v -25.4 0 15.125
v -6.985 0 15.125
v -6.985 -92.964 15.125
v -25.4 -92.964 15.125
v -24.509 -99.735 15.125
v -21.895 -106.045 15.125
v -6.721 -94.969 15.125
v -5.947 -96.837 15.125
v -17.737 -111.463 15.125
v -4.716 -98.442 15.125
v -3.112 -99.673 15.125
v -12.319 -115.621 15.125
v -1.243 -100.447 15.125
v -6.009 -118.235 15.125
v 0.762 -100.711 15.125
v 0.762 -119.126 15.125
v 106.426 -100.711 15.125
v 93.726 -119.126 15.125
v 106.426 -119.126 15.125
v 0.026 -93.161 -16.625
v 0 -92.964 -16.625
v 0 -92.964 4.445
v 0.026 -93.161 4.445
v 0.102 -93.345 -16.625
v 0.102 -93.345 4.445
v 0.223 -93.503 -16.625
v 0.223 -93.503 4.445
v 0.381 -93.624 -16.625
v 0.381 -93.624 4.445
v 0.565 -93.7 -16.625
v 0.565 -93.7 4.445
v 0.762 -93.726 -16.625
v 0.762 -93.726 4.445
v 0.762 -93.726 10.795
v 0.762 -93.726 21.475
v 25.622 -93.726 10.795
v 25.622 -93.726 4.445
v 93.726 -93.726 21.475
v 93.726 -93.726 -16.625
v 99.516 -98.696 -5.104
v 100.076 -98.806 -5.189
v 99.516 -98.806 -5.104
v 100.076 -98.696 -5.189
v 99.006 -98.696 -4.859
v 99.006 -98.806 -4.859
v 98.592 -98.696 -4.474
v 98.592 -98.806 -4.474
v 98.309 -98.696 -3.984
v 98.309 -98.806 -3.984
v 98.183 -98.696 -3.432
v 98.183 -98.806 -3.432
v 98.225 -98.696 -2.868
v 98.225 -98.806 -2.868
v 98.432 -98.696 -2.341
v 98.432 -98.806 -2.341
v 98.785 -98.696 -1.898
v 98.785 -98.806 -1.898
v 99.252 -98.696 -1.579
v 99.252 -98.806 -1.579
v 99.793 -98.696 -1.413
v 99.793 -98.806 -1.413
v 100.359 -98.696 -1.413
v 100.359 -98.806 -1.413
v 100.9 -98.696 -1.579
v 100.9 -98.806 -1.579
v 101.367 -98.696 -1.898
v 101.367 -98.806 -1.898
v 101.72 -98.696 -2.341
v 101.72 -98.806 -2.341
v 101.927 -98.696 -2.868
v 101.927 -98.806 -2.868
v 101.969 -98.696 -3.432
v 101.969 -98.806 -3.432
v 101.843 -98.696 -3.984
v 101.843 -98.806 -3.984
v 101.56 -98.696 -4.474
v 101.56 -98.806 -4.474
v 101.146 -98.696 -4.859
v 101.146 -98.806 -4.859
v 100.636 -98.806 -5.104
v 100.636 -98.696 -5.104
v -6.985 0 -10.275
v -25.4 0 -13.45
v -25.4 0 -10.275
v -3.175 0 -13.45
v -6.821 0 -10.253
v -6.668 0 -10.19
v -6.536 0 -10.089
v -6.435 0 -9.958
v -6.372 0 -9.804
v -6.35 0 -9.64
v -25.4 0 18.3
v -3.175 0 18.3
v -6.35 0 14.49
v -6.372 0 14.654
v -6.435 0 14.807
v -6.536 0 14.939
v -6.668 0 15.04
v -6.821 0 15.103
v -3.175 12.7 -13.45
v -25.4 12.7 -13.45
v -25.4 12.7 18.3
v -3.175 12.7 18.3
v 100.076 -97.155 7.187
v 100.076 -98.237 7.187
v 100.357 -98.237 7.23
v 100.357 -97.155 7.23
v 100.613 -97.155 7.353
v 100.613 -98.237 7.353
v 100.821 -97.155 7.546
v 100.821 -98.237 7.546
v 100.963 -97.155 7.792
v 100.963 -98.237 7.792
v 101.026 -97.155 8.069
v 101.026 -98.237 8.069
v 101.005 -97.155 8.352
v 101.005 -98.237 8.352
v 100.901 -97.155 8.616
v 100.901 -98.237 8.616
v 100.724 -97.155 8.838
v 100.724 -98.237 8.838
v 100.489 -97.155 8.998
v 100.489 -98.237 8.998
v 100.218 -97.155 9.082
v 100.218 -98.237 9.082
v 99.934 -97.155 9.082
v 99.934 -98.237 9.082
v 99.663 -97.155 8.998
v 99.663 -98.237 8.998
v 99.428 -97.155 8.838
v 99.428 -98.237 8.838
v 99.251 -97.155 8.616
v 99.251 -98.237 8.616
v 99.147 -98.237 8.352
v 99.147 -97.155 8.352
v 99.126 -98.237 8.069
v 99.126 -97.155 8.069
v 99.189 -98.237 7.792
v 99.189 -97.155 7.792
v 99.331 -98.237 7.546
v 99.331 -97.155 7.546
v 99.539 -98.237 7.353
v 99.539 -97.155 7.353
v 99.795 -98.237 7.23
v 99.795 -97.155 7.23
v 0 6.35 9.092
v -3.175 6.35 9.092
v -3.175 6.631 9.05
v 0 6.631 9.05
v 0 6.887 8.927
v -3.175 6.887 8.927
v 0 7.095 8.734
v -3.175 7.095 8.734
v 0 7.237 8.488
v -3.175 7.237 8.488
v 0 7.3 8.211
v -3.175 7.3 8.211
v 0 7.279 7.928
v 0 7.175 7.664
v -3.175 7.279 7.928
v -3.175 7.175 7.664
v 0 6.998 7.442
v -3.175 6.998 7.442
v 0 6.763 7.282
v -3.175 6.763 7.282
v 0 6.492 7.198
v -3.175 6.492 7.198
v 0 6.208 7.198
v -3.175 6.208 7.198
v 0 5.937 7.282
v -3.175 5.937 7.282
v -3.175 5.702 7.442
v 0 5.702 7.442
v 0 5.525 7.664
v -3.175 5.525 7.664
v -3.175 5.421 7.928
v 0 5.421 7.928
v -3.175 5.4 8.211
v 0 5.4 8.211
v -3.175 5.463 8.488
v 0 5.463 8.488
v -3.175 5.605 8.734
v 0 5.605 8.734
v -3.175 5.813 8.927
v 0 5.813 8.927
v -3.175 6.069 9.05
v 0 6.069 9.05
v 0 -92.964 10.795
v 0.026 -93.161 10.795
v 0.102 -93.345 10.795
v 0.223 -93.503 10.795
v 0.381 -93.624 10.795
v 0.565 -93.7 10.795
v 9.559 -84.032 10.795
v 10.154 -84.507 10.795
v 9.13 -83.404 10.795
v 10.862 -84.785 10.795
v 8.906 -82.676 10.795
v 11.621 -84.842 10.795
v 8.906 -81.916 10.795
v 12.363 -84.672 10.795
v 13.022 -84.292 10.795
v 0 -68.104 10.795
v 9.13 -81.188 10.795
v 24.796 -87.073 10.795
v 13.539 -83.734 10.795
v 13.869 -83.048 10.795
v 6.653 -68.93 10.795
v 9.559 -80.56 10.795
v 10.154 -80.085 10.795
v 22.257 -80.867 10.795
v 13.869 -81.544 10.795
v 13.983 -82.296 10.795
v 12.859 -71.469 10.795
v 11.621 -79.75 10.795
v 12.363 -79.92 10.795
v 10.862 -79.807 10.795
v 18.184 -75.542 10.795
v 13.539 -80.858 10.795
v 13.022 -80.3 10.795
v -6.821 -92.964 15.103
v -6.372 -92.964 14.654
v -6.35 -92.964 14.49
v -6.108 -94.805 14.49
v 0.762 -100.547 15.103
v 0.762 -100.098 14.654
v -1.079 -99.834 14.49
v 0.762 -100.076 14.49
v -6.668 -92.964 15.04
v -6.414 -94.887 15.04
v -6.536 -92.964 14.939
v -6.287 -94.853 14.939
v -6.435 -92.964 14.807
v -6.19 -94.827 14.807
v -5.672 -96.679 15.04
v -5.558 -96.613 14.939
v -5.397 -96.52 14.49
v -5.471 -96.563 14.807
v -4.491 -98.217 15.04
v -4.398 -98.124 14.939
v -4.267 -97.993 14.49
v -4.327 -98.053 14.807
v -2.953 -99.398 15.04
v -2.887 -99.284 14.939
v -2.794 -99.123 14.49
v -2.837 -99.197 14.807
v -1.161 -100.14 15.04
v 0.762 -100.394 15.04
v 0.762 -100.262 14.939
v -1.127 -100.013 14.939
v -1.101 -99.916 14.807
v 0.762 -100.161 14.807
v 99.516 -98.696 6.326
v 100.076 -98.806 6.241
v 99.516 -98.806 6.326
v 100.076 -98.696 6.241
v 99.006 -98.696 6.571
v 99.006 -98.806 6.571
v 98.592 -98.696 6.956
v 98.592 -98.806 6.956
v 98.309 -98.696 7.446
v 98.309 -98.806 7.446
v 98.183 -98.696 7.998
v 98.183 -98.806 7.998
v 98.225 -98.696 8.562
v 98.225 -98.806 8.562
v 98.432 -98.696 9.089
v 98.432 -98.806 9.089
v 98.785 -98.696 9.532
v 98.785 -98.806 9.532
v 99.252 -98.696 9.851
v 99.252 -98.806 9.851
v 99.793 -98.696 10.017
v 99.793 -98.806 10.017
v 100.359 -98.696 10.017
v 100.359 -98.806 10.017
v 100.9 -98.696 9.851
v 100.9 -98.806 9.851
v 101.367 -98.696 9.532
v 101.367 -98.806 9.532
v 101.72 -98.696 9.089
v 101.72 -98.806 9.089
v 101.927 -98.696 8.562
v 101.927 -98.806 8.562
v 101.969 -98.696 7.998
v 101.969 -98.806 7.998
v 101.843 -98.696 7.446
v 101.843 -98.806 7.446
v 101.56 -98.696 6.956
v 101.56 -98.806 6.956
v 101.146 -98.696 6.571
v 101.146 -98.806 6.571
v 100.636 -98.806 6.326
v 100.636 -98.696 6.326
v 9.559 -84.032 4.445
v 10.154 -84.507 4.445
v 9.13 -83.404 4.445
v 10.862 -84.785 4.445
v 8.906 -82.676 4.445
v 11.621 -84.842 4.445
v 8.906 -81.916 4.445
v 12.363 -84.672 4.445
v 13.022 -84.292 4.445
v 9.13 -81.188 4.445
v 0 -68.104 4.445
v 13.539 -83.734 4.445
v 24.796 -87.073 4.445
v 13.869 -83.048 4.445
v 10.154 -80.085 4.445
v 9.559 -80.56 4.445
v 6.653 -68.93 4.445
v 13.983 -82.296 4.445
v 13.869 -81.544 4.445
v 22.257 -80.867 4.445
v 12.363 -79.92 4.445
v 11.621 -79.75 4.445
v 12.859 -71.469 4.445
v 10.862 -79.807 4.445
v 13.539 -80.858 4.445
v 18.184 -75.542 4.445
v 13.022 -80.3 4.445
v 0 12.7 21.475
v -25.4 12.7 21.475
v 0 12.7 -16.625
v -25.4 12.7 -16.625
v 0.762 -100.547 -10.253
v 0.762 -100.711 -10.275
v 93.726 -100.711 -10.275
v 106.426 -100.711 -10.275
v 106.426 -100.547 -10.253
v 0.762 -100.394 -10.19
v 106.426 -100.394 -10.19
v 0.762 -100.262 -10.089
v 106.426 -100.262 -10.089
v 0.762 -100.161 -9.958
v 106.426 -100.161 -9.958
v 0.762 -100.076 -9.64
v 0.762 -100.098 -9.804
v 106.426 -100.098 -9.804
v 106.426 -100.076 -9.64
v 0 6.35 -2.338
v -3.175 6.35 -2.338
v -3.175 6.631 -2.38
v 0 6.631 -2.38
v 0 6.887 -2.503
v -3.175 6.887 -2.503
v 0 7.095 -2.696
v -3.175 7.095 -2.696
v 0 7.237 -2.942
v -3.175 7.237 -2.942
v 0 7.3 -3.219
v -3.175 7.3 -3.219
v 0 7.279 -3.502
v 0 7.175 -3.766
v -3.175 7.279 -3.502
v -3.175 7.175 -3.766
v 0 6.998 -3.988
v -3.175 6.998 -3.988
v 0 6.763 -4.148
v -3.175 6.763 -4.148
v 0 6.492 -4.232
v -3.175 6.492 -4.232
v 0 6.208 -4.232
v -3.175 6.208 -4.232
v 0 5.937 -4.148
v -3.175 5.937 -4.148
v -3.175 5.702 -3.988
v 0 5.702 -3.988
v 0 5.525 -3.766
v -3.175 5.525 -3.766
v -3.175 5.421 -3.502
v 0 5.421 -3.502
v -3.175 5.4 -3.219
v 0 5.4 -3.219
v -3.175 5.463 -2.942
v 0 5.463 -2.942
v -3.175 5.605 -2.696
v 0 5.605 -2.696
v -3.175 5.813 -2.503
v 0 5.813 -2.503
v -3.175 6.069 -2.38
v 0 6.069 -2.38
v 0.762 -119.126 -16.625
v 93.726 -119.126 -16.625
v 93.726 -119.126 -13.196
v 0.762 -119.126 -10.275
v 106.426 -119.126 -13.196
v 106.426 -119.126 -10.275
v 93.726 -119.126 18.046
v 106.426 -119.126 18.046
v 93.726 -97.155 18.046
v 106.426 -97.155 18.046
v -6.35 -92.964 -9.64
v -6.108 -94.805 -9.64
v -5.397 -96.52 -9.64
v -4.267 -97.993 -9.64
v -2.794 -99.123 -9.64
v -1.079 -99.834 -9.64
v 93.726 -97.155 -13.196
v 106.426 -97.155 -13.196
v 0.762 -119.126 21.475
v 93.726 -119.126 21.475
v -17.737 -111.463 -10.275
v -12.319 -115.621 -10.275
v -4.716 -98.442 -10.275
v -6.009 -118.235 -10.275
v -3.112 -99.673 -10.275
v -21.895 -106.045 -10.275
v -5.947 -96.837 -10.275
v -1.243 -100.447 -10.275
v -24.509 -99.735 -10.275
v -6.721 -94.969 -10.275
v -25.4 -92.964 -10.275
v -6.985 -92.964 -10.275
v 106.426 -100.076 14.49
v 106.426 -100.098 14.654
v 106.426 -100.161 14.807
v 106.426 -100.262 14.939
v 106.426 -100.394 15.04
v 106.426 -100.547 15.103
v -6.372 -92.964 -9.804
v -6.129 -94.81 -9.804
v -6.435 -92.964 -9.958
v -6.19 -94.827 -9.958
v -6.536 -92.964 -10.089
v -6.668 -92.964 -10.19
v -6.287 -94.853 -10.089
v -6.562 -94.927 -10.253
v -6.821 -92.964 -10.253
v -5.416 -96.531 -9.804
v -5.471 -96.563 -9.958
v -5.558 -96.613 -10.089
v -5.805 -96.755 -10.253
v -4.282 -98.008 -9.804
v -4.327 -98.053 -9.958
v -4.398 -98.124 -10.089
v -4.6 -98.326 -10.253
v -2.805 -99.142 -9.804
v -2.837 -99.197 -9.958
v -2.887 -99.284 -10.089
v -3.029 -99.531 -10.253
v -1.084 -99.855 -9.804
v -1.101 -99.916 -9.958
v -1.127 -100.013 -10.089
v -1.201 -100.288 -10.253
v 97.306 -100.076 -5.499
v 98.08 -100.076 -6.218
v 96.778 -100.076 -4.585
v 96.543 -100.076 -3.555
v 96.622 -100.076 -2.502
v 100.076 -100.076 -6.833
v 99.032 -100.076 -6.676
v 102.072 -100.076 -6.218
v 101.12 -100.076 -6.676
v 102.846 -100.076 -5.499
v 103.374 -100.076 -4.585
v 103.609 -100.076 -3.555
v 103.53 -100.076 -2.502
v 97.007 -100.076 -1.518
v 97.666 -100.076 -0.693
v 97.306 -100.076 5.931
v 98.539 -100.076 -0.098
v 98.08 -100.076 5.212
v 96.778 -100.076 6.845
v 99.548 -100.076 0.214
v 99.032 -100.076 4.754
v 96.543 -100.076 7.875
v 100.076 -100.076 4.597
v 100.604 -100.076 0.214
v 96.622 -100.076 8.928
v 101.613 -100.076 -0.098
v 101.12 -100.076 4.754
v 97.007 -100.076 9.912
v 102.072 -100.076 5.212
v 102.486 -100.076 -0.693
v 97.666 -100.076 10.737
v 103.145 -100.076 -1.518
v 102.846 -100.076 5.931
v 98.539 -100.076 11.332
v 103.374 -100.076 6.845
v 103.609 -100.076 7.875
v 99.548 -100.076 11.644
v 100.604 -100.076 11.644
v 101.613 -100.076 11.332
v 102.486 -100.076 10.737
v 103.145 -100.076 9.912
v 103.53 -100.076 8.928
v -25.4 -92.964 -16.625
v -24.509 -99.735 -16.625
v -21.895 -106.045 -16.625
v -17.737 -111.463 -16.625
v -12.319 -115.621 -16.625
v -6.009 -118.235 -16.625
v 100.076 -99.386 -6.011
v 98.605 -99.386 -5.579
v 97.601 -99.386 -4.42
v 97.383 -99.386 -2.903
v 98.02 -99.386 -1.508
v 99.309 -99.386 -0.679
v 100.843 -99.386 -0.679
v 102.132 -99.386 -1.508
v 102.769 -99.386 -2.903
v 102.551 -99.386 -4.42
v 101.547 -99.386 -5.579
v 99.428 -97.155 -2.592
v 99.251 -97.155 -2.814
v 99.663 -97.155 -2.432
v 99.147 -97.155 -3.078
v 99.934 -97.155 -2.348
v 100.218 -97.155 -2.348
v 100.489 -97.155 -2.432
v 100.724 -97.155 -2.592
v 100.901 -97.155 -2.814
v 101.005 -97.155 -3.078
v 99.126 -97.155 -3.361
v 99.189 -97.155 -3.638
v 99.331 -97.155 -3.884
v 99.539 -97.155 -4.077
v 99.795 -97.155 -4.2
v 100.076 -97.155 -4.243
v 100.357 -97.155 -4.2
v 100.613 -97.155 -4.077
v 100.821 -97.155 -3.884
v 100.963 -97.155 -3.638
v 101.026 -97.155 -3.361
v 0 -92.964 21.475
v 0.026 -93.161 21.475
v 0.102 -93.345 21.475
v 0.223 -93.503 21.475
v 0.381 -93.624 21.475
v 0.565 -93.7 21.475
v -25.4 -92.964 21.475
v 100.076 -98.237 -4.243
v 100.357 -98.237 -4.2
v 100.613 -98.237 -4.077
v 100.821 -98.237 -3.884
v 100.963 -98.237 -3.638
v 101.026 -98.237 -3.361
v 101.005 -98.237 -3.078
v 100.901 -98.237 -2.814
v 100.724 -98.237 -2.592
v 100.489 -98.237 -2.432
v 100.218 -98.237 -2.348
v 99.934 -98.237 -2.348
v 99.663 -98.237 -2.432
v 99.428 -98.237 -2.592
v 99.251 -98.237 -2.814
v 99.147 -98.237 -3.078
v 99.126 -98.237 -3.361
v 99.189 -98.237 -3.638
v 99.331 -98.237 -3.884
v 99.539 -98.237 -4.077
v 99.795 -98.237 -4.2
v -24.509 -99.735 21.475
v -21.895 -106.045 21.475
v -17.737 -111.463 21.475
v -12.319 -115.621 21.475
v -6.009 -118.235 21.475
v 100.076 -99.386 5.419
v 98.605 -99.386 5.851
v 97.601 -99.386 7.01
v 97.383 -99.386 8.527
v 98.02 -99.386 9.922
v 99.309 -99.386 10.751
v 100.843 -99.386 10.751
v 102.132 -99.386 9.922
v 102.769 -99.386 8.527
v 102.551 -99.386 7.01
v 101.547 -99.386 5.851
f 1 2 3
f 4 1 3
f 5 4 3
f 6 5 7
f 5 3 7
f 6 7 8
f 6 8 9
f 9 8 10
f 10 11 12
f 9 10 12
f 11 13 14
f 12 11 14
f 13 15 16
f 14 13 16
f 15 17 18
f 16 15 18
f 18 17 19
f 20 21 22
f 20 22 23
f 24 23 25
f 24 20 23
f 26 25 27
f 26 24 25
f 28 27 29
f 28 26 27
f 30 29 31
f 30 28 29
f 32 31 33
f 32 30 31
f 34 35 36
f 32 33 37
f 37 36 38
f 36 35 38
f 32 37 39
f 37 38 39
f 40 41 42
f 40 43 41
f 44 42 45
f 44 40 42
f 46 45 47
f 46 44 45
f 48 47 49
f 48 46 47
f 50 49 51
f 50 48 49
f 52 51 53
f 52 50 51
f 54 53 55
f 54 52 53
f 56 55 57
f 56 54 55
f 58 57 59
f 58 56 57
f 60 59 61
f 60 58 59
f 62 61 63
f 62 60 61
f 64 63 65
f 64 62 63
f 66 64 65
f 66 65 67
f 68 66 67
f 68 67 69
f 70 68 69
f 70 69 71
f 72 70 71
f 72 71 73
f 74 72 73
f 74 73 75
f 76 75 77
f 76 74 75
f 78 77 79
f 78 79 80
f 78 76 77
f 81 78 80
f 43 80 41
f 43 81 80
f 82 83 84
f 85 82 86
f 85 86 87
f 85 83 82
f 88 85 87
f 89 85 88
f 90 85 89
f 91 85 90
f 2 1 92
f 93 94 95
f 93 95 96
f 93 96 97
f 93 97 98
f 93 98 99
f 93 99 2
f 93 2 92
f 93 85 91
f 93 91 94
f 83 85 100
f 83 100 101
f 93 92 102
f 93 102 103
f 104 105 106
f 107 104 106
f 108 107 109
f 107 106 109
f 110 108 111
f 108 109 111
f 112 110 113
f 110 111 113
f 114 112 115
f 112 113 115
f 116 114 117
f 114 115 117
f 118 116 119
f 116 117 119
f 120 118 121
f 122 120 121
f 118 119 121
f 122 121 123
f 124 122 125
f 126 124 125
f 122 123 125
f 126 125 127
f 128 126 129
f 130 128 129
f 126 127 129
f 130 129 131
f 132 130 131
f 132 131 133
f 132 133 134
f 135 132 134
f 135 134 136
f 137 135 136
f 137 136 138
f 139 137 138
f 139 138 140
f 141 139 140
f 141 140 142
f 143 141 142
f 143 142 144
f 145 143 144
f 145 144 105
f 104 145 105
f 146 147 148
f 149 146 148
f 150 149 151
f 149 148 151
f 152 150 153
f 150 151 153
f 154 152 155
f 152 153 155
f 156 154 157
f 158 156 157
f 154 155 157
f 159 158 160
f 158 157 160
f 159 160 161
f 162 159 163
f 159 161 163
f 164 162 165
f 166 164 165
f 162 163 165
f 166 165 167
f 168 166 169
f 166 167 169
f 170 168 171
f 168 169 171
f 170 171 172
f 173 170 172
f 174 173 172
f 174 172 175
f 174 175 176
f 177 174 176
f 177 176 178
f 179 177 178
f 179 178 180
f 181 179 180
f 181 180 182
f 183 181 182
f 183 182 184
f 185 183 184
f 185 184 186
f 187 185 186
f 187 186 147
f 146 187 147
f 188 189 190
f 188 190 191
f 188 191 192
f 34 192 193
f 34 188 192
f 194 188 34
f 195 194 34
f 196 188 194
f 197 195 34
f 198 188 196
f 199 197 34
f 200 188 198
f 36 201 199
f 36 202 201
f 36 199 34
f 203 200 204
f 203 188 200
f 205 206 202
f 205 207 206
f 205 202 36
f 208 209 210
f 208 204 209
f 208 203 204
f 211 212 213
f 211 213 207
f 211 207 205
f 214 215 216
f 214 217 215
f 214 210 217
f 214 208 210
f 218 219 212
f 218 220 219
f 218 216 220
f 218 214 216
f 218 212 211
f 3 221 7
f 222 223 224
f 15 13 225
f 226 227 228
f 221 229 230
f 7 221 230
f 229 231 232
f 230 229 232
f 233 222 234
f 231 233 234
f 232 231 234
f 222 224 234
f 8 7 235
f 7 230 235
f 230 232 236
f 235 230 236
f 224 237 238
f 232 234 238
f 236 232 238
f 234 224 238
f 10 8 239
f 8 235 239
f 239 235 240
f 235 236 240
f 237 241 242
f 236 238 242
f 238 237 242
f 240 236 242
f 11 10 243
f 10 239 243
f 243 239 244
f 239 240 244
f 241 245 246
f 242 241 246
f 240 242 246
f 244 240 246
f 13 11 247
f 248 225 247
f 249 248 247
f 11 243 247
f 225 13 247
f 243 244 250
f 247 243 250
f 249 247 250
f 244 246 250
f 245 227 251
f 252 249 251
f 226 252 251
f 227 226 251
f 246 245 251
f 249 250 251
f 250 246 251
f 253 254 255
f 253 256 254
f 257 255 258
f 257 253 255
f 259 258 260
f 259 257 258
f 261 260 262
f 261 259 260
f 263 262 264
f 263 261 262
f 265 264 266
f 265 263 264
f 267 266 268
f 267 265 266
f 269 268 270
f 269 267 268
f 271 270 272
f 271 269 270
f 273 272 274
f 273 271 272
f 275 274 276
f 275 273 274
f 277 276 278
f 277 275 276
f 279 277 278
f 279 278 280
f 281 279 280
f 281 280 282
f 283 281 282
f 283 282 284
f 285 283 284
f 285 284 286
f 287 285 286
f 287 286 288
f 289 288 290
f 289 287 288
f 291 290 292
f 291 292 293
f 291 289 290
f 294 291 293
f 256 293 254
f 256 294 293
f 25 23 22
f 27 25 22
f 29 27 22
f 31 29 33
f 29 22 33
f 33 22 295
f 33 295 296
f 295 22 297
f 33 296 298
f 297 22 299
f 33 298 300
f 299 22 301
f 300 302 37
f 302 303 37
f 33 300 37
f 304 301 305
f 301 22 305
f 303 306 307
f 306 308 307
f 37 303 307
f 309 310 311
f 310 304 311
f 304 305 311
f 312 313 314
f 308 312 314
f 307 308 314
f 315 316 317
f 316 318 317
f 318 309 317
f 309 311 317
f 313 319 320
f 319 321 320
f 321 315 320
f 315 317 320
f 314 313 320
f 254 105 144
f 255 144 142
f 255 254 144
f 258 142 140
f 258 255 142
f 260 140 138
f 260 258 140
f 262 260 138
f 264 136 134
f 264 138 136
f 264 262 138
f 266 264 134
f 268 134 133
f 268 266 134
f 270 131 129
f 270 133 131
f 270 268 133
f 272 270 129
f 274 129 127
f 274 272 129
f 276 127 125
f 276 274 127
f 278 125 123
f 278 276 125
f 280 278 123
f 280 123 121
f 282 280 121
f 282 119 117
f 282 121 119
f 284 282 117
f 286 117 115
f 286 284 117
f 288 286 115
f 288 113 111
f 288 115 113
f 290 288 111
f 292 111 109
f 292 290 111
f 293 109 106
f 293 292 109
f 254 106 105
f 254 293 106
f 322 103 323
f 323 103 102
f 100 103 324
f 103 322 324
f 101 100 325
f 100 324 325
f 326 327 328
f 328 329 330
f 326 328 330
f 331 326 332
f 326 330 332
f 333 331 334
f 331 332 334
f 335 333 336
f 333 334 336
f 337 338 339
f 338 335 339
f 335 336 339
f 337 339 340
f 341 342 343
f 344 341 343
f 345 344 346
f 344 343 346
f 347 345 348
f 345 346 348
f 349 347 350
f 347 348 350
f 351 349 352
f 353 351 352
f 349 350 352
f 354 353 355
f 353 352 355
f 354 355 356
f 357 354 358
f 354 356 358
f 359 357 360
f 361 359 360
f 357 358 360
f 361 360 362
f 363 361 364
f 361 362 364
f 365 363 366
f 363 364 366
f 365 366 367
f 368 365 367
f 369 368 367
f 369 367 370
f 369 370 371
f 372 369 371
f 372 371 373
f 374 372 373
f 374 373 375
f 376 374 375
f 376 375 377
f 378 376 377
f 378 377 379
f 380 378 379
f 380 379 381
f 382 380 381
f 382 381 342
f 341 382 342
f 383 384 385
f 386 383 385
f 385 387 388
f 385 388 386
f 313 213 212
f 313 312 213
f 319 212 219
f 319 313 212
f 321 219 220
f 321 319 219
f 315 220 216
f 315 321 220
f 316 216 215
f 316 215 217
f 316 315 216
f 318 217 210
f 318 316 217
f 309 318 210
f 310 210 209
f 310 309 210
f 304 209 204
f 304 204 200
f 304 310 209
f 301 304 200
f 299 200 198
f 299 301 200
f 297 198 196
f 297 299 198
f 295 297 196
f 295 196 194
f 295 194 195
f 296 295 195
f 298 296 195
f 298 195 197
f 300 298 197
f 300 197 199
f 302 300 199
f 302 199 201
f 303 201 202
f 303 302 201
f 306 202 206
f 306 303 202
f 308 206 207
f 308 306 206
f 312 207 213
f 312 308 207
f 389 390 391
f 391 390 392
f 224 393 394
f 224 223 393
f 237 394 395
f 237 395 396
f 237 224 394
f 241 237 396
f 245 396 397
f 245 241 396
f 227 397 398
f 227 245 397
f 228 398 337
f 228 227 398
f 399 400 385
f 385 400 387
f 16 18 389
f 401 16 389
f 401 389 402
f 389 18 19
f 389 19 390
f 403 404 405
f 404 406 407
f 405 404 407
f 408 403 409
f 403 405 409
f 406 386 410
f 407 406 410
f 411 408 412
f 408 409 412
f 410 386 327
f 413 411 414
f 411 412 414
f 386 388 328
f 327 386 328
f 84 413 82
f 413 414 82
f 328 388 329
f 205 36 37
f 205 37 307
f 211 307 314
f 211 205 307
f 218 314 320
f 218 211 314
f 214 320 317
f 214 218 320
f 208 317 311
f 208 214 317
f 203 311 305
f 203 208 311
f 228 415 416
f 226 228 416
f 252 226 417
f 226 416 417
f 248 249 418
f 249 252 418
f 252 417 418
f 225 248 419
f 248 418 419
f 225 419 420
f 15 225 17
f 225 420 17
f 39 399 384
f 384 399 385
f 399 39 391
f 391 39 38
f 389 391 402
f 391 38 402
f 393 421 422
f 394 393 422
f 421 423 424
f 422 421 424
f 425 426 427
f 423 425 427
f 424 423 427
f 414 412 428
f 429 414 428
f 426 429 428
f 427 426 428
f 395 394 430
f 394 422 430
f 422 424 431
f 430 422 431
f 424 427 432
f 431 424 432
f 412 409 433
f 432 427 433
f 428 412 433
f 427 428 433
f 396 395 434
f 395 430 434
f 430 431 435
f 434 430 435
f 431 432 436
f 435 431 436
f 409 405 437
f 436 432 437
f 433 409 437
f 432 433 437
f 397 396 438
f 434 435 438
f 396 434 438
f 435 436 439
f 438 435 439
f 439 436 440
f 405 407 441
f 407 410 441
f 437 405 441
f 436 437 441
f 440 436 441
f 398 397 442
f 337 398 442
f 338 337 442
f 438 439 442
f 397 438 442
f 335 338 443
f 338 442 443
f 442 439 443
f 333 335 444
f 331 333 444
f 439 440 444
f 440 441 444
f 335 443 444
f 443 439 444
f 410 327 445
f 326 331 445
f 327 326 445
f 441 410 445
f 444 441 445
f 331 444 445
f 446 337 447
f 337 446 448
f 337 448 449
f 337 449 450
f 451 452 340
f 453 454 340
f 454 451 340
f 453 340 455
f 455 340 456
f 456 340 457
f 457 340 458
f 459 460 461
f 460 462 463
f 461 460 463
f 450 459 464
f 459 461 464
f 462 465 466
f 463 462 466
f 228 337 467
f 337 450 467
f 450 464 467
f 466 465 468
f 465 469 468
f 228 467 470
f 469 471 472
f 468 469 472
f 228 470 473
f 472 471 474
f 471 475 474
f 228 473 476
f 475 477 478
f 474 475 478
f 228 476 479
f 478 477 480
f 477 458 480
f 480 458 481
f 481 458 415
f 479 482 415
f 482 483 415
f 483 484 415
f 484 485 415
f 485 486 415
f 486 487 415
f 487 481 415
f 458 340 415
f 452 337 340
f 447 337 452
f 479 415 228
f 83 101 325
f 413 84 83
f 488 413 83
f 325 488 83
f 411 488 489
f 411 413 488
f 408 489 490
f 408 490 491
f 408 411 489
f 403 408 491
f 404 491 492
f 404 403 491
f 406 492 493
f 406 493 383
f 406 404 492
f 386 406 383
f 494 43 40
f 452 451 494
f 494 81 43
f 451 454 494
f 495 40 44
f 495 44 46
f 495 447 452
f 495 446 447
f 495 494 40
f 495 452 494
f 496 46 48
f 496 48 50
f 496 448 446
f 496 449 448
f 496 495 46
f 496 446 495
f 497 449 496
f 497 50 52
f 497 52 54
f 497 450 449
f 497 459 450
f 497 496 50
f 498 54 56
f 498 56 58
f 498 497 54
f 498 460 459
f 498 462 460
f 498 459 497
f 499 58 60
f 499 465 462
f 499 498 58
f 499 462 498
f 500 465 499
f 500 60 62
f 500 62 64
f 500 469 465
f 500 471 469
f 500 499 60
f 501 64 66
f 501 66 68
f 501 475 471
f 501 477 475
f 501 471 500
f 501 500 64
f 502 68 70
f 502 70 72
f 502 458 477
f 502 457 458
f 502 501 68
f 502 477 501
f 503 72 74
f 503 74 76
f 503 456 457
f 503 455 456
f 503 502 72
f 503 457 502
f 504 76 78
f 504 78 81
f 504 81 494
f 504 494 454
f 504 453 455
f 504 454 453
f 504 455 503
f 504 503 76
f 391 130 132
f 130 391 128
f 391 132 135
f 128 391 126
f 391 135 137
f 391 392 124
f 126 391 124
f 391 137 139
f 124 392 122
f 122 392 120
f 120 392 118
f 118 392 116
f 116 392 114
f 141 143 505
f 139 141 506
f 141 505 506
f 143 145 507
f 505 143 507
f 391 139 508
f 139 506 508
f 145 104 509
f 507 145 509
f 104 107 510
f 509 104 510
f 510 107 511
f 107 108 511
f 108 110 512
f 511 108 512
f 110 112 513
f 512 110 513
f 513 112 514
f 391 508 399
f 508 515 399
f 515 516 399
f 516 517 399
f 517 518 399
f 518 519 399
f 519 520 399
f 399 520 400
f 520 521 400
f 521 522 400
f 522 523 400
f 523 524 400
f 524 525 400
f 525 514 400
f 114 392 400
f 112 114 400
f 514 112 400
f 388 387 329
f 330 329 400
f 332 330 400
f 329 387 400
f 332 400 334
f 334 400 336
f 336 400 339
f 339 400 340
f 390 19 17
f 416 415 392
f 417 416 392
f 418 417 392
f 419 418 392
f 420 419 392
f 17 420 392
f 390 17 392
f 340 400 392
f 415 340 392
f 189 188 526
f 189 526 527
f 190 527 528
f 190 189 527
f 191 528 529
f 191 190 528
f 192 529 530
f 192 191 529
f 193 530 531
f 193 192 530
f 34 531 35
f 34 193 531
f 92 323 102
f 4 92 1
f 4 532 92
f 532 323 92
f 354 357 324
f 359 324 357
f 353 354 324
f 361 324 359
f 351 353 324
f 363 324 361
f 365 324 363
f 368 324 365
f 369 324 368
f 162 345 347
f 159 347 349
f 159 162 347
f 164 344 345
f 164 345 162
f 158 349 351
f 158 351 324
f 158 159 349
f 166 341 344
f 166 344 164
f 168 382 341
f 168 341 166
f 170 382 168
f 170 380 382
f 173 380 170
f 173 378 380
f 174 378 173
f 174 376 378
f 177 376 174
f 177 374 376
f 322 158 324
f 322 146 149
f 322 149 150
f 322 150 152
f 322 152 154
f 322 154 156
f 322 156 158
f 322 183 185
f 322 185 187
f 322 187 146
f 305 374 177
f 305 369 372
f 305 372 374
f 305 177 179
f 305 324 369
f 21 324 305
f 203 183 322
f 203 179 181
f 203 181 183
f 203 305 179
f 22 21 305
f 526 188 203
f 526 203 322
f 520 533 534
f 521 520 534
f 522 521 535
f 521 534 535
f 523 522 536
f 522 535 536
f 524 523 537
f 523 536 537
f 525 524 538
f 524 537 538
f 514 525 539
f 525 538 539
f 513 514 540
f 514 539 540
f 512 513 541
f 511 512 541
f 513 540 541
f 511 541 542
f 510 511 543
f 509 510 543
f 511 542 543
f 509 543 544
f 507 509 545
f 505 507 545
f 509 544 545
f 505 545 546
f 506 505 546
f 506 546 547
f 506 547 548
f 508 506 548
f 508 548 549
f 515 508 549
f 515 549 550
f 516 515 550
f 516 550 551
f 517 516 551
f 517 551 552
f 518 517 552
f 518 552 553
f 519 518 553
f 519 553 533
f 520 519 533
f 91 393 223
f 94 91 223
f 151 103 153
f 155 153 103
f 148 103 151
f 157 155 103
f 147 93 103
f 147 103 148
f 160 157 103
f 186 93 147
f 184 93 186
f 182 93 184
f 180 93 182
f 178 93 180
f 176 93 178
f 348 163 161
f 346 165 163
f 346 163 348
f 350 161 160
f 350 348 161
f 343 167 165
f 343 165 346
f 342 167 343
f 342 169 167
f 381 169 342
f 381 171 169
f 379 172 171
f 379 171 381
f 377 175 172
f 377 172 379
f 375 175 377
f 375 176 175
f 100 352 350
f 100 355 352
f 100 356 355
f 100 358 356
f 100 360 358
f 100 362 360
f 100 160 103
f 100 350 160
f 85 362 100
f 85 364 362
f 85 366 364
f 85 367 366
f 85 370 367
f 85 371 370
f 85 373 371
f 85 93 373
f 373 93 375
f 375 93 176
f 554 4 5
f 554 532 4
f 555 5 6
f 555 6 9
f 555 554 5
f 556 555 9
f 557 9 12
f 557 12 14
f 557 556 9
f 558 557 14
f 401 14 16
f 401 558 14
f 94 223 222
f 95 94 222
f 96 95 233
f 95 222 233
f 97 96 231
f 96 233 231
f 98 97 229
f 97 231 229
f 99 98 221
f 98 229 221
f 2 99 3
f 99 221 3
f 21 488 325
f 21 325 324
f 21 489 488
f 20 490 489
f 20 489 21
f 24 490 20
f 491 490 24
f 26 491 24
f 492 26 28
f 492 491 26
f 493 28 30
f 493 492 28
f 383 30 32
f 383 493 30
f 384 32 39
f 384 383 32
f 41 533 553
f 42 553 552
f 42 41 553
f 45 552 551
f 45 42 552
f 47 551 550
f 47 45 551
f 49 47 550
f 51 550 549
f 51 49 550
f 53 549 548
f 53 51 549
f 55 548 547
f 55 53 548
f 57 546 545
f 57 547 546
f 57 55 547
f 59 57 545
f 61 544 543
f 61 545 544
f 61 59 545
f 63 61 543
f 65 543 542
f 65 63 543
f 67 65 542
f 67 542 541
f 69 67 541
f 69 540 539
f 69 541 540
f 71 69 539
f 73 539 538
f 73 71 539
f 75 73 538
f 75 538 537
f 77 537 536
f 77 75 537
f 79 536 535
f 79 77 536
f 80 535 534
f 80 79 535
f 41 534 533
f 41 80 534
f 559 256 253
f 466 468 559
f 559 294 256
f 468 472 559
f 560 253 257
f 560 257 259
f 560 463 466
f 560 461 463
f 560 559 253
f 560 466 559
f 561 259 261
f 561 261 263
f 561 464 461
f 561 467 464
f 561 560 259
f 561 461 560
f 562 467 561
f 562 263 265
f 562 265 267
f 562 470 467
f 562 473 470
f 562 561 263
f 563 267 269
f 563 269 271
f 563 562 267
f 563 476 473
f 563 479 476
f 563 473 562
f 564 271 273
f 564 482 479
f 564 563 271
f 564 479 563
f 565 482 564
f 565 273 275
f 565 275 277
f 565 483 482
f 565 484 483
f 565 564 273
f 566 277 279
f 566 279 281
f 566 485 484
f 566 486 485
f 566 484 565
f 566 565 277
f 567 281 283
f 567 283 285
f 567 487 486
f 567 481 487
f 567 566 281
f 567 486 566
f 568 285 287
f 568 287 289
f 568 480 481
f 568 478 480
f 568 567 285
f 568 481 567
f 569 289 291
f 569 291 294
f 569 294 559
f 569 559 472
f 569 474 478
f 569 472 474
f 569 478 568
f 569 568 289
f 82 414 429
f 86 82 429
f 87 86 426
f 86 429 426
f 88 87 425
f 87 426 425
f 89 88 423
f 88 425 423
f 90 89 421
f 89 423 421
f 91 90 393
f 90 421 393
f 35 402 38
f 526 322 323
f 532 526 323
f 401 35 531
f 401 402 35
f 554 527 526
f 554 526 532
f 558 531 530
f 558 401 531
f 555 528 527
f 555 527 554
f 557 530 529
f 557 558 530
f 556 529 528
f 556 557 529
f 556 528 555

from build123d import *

# Parameters (mm, degrees)
BOSS_EXTRUDE2_START  = 12.7
BOSS_EXTRUDE2_DEPTH  = 12.7
BOSS_EXTRUDE3_DEPTH  = 12.7
SKETCH8_R            = 0.9525
CUT_EXTRUDE1_DEPTH   = 157.544227843
SKETCH9_R            = 0.9525
CUT_EXTRUDE2_DEPTH   = 164.292861742
SKETCH12_R           = 2.5527
BOSS_EXTRUDE10_DEPTH = 3.175


with BuildPart() as part:
    # Sweep1: sweep along a path in Sketch4
    with BuildLine(Plane.XY) as sweep1_path:
        Line((0, 0), (0, -92.964))
        ThreePointArc((0, -92.964), (0.223184633, -93.502815367), (0.762, -93.726))
        Line((0.762, -93.726), (93.726, -93.726))
    # Sketch3 → Sweep1 (sweep)
    with BuildSketch(Plane(origin=(0, 0, 0), x_dir=(1, 0, 0), z_dir=(0, 1, 0))):
        with BuildLine():
            Line((0, 16.62500014), (-25.4, 16.62500014))
            Line((-25.4, 16.62500014), (-25.4, 10.27500014))
            Line((-25.4, 10.27500014), (-6.985, 10.27500014))
            ThreePointArc((-6.985, 10.27500014), (-6.535987194, 10.089012946), (-6.35, 9.64000014))
            Line((-6.35, 9.64000014), (-6.35, -14.48999986))
            ThreePointArc((-6.35, -14.48999986), (-6.535987194, -14.939012666), (-6.985, -15.12499986))
            Line((-6.985, -15.12499986), (-25.4, -15.12499986))
            Line((-25.4, -15.12499986), (-25.4, -21.47499986))
            Line((-25.4, -21.47499986), (0, -21.47499986))
            Line((0, -21.47499986), (0, 16.62500014))
        make_face()
    sweep(path=sweep1_path.line)

    # Sketch6 → Boss-Extrude2 (add)
    with BuildSketch(Plane(origin=(93.726, 0, 0), x_dir=(0, 0, -1), z_dir=(1, 0, 0)).offset(BOSS_EXTRUDE2_START)):
        with BuildLine():
            Line((-18.04599986, -97.155), (13.19600014, -97.155))
            Line((13.19600014, -97.155), (13.19600014, -119.126))
            Line((13.19600014, -119.126), (10.27500014, -119.126))
            Line((10.27500014, -119.126), (10.27500014, -100.711))
            ThreePointArc((10.27500014, -100.711), (10.089012946, -100.261987194), (9.64000014, -100.076))
            Line((9.64000014, -100.076), (-14.48999986, -100.076))
            ThreePointArc((-14.48999986, -100.076), (-14.939012666, -100.261987194), (-15.12499986, -100.711))
            Line((-15.12499986, -100.711), (-15.12499986, -119.126))
            Line((-15.12499986, -119.126), (-18.04599986, -119.126))
            Line((-18.04599986, -119.126), (-18.04599986, -97.155))
        make_face()
    extrude(amount=-BOSS_EXTRUDE2_DEPTH)

    # Sketch7 → Boss-Extrude3 (add)
    with BuildSketch(Plane(origin=(0, 0, 0), x_dir=(1, 0, 0), z_dir=(0, 1, 0))):
        Polygon((-25.4, 13.45000014), (-25.4, 16.62500014), (0, 16.62500014), (0, -21.47499986), (-25.4, -21.47499986), (-25.4, -18.29999986), (-3.175, -18.29999986), (-3.175, 13.45000014), align=None)
    extrude(amount=BOSS_EXTRUDE3_DEPTH)

    # Sketch8 → Cut-Extrude1 (cut, through all)
    with BuildSketch(Plane.XZ.offset(100.076)):
        with Locations(Location((100.076, 8.13999986, 0), (0, 0, 270))):
            Circle(SKETCH8_R)
        with Locations(Location((100.076, -3.29000014, 0), (0, 0, 270))):
            Circle(SKETCH8_R)
    extrude(amount=-CUT_EXTRUDE1_DEPTH, mode=Mode.SUBTRACT)

    # Sketch9 → Cut-Extrude2 (cut, through all)
    with BuildSketch(Plane.ZY.offset(3.175)):
        with Locations((-3.29000014, 6.35)):
            Circle(SKETCH9_R)
        with Locations((8.13999986, 6.35)):
            Circle(SKETCH9_R)
    extrude(amount=-CUT_EXTRUDE2_DEPTH, mode=Mode.SUBTRACT)

    # Sketch12 → Boss-Extrude10 (add, symmetric)
    with BuildSketch(Plane.XY.offset(7.62)):
        with BuildLine():
            Line((0.762, -93.726), (25.622204075, -93.726))
            ThreePointArc((25.622204075, -93.726), (18.183696875, -75.542303125), (0, -68.103795925))
            Line((0, -68.103795925), (0, -92.964))
            ThreePointArc((0, -92.964), (0.223184633, -93.502815367), (0.762, -93.726))
        make_face()
        with Locations((11.43, -82.296)):
            Circle(SKETCH12_R, mode=Mode.SUBTRACT)
    extrude(amount=BOSS_EXTRUDE10_DEPTH, both=True)

    # Sketch14 → CSK for _6 Flat Head Machine Screw _100 (revolve, cut)
    with BuildSketch(Plane(origin=(100.076, -100.076, -3.29000014), x_dir=(0, 0, -1), z_dir=(1, 0, 0))):
        Polygon((0, 0), (0, 2.410824014), (1.89865, 1.27), (1.89865, 1.380025208), (3.5433, 0), align=None)
    revolve(axis=Axis((100.076, -106.426, -3.29000014), (0, 1, 0)), mode=Mode.SUBTRACT)

    # Sketch16 → CSK for _6 Flat Head Machine Screw _ 2 (revolve, cut)
    with BuildSketch(Plane(origin=(100.076, -100.076, 8.13999986), x_dir=(0, 0, -1), z_dir=(1, 0, 0))):
        Polygon((0, 0), (0, 2.410824014), (1.89865, 1.27), (1.89865, 1.380025208), (3.5433, 0), align=None)
    revolve(axis=Axis((100.076, -106.426, 8.13999986), (0, 1, 0)), mode=Mode.SUBTRACT)


solid = part.part
